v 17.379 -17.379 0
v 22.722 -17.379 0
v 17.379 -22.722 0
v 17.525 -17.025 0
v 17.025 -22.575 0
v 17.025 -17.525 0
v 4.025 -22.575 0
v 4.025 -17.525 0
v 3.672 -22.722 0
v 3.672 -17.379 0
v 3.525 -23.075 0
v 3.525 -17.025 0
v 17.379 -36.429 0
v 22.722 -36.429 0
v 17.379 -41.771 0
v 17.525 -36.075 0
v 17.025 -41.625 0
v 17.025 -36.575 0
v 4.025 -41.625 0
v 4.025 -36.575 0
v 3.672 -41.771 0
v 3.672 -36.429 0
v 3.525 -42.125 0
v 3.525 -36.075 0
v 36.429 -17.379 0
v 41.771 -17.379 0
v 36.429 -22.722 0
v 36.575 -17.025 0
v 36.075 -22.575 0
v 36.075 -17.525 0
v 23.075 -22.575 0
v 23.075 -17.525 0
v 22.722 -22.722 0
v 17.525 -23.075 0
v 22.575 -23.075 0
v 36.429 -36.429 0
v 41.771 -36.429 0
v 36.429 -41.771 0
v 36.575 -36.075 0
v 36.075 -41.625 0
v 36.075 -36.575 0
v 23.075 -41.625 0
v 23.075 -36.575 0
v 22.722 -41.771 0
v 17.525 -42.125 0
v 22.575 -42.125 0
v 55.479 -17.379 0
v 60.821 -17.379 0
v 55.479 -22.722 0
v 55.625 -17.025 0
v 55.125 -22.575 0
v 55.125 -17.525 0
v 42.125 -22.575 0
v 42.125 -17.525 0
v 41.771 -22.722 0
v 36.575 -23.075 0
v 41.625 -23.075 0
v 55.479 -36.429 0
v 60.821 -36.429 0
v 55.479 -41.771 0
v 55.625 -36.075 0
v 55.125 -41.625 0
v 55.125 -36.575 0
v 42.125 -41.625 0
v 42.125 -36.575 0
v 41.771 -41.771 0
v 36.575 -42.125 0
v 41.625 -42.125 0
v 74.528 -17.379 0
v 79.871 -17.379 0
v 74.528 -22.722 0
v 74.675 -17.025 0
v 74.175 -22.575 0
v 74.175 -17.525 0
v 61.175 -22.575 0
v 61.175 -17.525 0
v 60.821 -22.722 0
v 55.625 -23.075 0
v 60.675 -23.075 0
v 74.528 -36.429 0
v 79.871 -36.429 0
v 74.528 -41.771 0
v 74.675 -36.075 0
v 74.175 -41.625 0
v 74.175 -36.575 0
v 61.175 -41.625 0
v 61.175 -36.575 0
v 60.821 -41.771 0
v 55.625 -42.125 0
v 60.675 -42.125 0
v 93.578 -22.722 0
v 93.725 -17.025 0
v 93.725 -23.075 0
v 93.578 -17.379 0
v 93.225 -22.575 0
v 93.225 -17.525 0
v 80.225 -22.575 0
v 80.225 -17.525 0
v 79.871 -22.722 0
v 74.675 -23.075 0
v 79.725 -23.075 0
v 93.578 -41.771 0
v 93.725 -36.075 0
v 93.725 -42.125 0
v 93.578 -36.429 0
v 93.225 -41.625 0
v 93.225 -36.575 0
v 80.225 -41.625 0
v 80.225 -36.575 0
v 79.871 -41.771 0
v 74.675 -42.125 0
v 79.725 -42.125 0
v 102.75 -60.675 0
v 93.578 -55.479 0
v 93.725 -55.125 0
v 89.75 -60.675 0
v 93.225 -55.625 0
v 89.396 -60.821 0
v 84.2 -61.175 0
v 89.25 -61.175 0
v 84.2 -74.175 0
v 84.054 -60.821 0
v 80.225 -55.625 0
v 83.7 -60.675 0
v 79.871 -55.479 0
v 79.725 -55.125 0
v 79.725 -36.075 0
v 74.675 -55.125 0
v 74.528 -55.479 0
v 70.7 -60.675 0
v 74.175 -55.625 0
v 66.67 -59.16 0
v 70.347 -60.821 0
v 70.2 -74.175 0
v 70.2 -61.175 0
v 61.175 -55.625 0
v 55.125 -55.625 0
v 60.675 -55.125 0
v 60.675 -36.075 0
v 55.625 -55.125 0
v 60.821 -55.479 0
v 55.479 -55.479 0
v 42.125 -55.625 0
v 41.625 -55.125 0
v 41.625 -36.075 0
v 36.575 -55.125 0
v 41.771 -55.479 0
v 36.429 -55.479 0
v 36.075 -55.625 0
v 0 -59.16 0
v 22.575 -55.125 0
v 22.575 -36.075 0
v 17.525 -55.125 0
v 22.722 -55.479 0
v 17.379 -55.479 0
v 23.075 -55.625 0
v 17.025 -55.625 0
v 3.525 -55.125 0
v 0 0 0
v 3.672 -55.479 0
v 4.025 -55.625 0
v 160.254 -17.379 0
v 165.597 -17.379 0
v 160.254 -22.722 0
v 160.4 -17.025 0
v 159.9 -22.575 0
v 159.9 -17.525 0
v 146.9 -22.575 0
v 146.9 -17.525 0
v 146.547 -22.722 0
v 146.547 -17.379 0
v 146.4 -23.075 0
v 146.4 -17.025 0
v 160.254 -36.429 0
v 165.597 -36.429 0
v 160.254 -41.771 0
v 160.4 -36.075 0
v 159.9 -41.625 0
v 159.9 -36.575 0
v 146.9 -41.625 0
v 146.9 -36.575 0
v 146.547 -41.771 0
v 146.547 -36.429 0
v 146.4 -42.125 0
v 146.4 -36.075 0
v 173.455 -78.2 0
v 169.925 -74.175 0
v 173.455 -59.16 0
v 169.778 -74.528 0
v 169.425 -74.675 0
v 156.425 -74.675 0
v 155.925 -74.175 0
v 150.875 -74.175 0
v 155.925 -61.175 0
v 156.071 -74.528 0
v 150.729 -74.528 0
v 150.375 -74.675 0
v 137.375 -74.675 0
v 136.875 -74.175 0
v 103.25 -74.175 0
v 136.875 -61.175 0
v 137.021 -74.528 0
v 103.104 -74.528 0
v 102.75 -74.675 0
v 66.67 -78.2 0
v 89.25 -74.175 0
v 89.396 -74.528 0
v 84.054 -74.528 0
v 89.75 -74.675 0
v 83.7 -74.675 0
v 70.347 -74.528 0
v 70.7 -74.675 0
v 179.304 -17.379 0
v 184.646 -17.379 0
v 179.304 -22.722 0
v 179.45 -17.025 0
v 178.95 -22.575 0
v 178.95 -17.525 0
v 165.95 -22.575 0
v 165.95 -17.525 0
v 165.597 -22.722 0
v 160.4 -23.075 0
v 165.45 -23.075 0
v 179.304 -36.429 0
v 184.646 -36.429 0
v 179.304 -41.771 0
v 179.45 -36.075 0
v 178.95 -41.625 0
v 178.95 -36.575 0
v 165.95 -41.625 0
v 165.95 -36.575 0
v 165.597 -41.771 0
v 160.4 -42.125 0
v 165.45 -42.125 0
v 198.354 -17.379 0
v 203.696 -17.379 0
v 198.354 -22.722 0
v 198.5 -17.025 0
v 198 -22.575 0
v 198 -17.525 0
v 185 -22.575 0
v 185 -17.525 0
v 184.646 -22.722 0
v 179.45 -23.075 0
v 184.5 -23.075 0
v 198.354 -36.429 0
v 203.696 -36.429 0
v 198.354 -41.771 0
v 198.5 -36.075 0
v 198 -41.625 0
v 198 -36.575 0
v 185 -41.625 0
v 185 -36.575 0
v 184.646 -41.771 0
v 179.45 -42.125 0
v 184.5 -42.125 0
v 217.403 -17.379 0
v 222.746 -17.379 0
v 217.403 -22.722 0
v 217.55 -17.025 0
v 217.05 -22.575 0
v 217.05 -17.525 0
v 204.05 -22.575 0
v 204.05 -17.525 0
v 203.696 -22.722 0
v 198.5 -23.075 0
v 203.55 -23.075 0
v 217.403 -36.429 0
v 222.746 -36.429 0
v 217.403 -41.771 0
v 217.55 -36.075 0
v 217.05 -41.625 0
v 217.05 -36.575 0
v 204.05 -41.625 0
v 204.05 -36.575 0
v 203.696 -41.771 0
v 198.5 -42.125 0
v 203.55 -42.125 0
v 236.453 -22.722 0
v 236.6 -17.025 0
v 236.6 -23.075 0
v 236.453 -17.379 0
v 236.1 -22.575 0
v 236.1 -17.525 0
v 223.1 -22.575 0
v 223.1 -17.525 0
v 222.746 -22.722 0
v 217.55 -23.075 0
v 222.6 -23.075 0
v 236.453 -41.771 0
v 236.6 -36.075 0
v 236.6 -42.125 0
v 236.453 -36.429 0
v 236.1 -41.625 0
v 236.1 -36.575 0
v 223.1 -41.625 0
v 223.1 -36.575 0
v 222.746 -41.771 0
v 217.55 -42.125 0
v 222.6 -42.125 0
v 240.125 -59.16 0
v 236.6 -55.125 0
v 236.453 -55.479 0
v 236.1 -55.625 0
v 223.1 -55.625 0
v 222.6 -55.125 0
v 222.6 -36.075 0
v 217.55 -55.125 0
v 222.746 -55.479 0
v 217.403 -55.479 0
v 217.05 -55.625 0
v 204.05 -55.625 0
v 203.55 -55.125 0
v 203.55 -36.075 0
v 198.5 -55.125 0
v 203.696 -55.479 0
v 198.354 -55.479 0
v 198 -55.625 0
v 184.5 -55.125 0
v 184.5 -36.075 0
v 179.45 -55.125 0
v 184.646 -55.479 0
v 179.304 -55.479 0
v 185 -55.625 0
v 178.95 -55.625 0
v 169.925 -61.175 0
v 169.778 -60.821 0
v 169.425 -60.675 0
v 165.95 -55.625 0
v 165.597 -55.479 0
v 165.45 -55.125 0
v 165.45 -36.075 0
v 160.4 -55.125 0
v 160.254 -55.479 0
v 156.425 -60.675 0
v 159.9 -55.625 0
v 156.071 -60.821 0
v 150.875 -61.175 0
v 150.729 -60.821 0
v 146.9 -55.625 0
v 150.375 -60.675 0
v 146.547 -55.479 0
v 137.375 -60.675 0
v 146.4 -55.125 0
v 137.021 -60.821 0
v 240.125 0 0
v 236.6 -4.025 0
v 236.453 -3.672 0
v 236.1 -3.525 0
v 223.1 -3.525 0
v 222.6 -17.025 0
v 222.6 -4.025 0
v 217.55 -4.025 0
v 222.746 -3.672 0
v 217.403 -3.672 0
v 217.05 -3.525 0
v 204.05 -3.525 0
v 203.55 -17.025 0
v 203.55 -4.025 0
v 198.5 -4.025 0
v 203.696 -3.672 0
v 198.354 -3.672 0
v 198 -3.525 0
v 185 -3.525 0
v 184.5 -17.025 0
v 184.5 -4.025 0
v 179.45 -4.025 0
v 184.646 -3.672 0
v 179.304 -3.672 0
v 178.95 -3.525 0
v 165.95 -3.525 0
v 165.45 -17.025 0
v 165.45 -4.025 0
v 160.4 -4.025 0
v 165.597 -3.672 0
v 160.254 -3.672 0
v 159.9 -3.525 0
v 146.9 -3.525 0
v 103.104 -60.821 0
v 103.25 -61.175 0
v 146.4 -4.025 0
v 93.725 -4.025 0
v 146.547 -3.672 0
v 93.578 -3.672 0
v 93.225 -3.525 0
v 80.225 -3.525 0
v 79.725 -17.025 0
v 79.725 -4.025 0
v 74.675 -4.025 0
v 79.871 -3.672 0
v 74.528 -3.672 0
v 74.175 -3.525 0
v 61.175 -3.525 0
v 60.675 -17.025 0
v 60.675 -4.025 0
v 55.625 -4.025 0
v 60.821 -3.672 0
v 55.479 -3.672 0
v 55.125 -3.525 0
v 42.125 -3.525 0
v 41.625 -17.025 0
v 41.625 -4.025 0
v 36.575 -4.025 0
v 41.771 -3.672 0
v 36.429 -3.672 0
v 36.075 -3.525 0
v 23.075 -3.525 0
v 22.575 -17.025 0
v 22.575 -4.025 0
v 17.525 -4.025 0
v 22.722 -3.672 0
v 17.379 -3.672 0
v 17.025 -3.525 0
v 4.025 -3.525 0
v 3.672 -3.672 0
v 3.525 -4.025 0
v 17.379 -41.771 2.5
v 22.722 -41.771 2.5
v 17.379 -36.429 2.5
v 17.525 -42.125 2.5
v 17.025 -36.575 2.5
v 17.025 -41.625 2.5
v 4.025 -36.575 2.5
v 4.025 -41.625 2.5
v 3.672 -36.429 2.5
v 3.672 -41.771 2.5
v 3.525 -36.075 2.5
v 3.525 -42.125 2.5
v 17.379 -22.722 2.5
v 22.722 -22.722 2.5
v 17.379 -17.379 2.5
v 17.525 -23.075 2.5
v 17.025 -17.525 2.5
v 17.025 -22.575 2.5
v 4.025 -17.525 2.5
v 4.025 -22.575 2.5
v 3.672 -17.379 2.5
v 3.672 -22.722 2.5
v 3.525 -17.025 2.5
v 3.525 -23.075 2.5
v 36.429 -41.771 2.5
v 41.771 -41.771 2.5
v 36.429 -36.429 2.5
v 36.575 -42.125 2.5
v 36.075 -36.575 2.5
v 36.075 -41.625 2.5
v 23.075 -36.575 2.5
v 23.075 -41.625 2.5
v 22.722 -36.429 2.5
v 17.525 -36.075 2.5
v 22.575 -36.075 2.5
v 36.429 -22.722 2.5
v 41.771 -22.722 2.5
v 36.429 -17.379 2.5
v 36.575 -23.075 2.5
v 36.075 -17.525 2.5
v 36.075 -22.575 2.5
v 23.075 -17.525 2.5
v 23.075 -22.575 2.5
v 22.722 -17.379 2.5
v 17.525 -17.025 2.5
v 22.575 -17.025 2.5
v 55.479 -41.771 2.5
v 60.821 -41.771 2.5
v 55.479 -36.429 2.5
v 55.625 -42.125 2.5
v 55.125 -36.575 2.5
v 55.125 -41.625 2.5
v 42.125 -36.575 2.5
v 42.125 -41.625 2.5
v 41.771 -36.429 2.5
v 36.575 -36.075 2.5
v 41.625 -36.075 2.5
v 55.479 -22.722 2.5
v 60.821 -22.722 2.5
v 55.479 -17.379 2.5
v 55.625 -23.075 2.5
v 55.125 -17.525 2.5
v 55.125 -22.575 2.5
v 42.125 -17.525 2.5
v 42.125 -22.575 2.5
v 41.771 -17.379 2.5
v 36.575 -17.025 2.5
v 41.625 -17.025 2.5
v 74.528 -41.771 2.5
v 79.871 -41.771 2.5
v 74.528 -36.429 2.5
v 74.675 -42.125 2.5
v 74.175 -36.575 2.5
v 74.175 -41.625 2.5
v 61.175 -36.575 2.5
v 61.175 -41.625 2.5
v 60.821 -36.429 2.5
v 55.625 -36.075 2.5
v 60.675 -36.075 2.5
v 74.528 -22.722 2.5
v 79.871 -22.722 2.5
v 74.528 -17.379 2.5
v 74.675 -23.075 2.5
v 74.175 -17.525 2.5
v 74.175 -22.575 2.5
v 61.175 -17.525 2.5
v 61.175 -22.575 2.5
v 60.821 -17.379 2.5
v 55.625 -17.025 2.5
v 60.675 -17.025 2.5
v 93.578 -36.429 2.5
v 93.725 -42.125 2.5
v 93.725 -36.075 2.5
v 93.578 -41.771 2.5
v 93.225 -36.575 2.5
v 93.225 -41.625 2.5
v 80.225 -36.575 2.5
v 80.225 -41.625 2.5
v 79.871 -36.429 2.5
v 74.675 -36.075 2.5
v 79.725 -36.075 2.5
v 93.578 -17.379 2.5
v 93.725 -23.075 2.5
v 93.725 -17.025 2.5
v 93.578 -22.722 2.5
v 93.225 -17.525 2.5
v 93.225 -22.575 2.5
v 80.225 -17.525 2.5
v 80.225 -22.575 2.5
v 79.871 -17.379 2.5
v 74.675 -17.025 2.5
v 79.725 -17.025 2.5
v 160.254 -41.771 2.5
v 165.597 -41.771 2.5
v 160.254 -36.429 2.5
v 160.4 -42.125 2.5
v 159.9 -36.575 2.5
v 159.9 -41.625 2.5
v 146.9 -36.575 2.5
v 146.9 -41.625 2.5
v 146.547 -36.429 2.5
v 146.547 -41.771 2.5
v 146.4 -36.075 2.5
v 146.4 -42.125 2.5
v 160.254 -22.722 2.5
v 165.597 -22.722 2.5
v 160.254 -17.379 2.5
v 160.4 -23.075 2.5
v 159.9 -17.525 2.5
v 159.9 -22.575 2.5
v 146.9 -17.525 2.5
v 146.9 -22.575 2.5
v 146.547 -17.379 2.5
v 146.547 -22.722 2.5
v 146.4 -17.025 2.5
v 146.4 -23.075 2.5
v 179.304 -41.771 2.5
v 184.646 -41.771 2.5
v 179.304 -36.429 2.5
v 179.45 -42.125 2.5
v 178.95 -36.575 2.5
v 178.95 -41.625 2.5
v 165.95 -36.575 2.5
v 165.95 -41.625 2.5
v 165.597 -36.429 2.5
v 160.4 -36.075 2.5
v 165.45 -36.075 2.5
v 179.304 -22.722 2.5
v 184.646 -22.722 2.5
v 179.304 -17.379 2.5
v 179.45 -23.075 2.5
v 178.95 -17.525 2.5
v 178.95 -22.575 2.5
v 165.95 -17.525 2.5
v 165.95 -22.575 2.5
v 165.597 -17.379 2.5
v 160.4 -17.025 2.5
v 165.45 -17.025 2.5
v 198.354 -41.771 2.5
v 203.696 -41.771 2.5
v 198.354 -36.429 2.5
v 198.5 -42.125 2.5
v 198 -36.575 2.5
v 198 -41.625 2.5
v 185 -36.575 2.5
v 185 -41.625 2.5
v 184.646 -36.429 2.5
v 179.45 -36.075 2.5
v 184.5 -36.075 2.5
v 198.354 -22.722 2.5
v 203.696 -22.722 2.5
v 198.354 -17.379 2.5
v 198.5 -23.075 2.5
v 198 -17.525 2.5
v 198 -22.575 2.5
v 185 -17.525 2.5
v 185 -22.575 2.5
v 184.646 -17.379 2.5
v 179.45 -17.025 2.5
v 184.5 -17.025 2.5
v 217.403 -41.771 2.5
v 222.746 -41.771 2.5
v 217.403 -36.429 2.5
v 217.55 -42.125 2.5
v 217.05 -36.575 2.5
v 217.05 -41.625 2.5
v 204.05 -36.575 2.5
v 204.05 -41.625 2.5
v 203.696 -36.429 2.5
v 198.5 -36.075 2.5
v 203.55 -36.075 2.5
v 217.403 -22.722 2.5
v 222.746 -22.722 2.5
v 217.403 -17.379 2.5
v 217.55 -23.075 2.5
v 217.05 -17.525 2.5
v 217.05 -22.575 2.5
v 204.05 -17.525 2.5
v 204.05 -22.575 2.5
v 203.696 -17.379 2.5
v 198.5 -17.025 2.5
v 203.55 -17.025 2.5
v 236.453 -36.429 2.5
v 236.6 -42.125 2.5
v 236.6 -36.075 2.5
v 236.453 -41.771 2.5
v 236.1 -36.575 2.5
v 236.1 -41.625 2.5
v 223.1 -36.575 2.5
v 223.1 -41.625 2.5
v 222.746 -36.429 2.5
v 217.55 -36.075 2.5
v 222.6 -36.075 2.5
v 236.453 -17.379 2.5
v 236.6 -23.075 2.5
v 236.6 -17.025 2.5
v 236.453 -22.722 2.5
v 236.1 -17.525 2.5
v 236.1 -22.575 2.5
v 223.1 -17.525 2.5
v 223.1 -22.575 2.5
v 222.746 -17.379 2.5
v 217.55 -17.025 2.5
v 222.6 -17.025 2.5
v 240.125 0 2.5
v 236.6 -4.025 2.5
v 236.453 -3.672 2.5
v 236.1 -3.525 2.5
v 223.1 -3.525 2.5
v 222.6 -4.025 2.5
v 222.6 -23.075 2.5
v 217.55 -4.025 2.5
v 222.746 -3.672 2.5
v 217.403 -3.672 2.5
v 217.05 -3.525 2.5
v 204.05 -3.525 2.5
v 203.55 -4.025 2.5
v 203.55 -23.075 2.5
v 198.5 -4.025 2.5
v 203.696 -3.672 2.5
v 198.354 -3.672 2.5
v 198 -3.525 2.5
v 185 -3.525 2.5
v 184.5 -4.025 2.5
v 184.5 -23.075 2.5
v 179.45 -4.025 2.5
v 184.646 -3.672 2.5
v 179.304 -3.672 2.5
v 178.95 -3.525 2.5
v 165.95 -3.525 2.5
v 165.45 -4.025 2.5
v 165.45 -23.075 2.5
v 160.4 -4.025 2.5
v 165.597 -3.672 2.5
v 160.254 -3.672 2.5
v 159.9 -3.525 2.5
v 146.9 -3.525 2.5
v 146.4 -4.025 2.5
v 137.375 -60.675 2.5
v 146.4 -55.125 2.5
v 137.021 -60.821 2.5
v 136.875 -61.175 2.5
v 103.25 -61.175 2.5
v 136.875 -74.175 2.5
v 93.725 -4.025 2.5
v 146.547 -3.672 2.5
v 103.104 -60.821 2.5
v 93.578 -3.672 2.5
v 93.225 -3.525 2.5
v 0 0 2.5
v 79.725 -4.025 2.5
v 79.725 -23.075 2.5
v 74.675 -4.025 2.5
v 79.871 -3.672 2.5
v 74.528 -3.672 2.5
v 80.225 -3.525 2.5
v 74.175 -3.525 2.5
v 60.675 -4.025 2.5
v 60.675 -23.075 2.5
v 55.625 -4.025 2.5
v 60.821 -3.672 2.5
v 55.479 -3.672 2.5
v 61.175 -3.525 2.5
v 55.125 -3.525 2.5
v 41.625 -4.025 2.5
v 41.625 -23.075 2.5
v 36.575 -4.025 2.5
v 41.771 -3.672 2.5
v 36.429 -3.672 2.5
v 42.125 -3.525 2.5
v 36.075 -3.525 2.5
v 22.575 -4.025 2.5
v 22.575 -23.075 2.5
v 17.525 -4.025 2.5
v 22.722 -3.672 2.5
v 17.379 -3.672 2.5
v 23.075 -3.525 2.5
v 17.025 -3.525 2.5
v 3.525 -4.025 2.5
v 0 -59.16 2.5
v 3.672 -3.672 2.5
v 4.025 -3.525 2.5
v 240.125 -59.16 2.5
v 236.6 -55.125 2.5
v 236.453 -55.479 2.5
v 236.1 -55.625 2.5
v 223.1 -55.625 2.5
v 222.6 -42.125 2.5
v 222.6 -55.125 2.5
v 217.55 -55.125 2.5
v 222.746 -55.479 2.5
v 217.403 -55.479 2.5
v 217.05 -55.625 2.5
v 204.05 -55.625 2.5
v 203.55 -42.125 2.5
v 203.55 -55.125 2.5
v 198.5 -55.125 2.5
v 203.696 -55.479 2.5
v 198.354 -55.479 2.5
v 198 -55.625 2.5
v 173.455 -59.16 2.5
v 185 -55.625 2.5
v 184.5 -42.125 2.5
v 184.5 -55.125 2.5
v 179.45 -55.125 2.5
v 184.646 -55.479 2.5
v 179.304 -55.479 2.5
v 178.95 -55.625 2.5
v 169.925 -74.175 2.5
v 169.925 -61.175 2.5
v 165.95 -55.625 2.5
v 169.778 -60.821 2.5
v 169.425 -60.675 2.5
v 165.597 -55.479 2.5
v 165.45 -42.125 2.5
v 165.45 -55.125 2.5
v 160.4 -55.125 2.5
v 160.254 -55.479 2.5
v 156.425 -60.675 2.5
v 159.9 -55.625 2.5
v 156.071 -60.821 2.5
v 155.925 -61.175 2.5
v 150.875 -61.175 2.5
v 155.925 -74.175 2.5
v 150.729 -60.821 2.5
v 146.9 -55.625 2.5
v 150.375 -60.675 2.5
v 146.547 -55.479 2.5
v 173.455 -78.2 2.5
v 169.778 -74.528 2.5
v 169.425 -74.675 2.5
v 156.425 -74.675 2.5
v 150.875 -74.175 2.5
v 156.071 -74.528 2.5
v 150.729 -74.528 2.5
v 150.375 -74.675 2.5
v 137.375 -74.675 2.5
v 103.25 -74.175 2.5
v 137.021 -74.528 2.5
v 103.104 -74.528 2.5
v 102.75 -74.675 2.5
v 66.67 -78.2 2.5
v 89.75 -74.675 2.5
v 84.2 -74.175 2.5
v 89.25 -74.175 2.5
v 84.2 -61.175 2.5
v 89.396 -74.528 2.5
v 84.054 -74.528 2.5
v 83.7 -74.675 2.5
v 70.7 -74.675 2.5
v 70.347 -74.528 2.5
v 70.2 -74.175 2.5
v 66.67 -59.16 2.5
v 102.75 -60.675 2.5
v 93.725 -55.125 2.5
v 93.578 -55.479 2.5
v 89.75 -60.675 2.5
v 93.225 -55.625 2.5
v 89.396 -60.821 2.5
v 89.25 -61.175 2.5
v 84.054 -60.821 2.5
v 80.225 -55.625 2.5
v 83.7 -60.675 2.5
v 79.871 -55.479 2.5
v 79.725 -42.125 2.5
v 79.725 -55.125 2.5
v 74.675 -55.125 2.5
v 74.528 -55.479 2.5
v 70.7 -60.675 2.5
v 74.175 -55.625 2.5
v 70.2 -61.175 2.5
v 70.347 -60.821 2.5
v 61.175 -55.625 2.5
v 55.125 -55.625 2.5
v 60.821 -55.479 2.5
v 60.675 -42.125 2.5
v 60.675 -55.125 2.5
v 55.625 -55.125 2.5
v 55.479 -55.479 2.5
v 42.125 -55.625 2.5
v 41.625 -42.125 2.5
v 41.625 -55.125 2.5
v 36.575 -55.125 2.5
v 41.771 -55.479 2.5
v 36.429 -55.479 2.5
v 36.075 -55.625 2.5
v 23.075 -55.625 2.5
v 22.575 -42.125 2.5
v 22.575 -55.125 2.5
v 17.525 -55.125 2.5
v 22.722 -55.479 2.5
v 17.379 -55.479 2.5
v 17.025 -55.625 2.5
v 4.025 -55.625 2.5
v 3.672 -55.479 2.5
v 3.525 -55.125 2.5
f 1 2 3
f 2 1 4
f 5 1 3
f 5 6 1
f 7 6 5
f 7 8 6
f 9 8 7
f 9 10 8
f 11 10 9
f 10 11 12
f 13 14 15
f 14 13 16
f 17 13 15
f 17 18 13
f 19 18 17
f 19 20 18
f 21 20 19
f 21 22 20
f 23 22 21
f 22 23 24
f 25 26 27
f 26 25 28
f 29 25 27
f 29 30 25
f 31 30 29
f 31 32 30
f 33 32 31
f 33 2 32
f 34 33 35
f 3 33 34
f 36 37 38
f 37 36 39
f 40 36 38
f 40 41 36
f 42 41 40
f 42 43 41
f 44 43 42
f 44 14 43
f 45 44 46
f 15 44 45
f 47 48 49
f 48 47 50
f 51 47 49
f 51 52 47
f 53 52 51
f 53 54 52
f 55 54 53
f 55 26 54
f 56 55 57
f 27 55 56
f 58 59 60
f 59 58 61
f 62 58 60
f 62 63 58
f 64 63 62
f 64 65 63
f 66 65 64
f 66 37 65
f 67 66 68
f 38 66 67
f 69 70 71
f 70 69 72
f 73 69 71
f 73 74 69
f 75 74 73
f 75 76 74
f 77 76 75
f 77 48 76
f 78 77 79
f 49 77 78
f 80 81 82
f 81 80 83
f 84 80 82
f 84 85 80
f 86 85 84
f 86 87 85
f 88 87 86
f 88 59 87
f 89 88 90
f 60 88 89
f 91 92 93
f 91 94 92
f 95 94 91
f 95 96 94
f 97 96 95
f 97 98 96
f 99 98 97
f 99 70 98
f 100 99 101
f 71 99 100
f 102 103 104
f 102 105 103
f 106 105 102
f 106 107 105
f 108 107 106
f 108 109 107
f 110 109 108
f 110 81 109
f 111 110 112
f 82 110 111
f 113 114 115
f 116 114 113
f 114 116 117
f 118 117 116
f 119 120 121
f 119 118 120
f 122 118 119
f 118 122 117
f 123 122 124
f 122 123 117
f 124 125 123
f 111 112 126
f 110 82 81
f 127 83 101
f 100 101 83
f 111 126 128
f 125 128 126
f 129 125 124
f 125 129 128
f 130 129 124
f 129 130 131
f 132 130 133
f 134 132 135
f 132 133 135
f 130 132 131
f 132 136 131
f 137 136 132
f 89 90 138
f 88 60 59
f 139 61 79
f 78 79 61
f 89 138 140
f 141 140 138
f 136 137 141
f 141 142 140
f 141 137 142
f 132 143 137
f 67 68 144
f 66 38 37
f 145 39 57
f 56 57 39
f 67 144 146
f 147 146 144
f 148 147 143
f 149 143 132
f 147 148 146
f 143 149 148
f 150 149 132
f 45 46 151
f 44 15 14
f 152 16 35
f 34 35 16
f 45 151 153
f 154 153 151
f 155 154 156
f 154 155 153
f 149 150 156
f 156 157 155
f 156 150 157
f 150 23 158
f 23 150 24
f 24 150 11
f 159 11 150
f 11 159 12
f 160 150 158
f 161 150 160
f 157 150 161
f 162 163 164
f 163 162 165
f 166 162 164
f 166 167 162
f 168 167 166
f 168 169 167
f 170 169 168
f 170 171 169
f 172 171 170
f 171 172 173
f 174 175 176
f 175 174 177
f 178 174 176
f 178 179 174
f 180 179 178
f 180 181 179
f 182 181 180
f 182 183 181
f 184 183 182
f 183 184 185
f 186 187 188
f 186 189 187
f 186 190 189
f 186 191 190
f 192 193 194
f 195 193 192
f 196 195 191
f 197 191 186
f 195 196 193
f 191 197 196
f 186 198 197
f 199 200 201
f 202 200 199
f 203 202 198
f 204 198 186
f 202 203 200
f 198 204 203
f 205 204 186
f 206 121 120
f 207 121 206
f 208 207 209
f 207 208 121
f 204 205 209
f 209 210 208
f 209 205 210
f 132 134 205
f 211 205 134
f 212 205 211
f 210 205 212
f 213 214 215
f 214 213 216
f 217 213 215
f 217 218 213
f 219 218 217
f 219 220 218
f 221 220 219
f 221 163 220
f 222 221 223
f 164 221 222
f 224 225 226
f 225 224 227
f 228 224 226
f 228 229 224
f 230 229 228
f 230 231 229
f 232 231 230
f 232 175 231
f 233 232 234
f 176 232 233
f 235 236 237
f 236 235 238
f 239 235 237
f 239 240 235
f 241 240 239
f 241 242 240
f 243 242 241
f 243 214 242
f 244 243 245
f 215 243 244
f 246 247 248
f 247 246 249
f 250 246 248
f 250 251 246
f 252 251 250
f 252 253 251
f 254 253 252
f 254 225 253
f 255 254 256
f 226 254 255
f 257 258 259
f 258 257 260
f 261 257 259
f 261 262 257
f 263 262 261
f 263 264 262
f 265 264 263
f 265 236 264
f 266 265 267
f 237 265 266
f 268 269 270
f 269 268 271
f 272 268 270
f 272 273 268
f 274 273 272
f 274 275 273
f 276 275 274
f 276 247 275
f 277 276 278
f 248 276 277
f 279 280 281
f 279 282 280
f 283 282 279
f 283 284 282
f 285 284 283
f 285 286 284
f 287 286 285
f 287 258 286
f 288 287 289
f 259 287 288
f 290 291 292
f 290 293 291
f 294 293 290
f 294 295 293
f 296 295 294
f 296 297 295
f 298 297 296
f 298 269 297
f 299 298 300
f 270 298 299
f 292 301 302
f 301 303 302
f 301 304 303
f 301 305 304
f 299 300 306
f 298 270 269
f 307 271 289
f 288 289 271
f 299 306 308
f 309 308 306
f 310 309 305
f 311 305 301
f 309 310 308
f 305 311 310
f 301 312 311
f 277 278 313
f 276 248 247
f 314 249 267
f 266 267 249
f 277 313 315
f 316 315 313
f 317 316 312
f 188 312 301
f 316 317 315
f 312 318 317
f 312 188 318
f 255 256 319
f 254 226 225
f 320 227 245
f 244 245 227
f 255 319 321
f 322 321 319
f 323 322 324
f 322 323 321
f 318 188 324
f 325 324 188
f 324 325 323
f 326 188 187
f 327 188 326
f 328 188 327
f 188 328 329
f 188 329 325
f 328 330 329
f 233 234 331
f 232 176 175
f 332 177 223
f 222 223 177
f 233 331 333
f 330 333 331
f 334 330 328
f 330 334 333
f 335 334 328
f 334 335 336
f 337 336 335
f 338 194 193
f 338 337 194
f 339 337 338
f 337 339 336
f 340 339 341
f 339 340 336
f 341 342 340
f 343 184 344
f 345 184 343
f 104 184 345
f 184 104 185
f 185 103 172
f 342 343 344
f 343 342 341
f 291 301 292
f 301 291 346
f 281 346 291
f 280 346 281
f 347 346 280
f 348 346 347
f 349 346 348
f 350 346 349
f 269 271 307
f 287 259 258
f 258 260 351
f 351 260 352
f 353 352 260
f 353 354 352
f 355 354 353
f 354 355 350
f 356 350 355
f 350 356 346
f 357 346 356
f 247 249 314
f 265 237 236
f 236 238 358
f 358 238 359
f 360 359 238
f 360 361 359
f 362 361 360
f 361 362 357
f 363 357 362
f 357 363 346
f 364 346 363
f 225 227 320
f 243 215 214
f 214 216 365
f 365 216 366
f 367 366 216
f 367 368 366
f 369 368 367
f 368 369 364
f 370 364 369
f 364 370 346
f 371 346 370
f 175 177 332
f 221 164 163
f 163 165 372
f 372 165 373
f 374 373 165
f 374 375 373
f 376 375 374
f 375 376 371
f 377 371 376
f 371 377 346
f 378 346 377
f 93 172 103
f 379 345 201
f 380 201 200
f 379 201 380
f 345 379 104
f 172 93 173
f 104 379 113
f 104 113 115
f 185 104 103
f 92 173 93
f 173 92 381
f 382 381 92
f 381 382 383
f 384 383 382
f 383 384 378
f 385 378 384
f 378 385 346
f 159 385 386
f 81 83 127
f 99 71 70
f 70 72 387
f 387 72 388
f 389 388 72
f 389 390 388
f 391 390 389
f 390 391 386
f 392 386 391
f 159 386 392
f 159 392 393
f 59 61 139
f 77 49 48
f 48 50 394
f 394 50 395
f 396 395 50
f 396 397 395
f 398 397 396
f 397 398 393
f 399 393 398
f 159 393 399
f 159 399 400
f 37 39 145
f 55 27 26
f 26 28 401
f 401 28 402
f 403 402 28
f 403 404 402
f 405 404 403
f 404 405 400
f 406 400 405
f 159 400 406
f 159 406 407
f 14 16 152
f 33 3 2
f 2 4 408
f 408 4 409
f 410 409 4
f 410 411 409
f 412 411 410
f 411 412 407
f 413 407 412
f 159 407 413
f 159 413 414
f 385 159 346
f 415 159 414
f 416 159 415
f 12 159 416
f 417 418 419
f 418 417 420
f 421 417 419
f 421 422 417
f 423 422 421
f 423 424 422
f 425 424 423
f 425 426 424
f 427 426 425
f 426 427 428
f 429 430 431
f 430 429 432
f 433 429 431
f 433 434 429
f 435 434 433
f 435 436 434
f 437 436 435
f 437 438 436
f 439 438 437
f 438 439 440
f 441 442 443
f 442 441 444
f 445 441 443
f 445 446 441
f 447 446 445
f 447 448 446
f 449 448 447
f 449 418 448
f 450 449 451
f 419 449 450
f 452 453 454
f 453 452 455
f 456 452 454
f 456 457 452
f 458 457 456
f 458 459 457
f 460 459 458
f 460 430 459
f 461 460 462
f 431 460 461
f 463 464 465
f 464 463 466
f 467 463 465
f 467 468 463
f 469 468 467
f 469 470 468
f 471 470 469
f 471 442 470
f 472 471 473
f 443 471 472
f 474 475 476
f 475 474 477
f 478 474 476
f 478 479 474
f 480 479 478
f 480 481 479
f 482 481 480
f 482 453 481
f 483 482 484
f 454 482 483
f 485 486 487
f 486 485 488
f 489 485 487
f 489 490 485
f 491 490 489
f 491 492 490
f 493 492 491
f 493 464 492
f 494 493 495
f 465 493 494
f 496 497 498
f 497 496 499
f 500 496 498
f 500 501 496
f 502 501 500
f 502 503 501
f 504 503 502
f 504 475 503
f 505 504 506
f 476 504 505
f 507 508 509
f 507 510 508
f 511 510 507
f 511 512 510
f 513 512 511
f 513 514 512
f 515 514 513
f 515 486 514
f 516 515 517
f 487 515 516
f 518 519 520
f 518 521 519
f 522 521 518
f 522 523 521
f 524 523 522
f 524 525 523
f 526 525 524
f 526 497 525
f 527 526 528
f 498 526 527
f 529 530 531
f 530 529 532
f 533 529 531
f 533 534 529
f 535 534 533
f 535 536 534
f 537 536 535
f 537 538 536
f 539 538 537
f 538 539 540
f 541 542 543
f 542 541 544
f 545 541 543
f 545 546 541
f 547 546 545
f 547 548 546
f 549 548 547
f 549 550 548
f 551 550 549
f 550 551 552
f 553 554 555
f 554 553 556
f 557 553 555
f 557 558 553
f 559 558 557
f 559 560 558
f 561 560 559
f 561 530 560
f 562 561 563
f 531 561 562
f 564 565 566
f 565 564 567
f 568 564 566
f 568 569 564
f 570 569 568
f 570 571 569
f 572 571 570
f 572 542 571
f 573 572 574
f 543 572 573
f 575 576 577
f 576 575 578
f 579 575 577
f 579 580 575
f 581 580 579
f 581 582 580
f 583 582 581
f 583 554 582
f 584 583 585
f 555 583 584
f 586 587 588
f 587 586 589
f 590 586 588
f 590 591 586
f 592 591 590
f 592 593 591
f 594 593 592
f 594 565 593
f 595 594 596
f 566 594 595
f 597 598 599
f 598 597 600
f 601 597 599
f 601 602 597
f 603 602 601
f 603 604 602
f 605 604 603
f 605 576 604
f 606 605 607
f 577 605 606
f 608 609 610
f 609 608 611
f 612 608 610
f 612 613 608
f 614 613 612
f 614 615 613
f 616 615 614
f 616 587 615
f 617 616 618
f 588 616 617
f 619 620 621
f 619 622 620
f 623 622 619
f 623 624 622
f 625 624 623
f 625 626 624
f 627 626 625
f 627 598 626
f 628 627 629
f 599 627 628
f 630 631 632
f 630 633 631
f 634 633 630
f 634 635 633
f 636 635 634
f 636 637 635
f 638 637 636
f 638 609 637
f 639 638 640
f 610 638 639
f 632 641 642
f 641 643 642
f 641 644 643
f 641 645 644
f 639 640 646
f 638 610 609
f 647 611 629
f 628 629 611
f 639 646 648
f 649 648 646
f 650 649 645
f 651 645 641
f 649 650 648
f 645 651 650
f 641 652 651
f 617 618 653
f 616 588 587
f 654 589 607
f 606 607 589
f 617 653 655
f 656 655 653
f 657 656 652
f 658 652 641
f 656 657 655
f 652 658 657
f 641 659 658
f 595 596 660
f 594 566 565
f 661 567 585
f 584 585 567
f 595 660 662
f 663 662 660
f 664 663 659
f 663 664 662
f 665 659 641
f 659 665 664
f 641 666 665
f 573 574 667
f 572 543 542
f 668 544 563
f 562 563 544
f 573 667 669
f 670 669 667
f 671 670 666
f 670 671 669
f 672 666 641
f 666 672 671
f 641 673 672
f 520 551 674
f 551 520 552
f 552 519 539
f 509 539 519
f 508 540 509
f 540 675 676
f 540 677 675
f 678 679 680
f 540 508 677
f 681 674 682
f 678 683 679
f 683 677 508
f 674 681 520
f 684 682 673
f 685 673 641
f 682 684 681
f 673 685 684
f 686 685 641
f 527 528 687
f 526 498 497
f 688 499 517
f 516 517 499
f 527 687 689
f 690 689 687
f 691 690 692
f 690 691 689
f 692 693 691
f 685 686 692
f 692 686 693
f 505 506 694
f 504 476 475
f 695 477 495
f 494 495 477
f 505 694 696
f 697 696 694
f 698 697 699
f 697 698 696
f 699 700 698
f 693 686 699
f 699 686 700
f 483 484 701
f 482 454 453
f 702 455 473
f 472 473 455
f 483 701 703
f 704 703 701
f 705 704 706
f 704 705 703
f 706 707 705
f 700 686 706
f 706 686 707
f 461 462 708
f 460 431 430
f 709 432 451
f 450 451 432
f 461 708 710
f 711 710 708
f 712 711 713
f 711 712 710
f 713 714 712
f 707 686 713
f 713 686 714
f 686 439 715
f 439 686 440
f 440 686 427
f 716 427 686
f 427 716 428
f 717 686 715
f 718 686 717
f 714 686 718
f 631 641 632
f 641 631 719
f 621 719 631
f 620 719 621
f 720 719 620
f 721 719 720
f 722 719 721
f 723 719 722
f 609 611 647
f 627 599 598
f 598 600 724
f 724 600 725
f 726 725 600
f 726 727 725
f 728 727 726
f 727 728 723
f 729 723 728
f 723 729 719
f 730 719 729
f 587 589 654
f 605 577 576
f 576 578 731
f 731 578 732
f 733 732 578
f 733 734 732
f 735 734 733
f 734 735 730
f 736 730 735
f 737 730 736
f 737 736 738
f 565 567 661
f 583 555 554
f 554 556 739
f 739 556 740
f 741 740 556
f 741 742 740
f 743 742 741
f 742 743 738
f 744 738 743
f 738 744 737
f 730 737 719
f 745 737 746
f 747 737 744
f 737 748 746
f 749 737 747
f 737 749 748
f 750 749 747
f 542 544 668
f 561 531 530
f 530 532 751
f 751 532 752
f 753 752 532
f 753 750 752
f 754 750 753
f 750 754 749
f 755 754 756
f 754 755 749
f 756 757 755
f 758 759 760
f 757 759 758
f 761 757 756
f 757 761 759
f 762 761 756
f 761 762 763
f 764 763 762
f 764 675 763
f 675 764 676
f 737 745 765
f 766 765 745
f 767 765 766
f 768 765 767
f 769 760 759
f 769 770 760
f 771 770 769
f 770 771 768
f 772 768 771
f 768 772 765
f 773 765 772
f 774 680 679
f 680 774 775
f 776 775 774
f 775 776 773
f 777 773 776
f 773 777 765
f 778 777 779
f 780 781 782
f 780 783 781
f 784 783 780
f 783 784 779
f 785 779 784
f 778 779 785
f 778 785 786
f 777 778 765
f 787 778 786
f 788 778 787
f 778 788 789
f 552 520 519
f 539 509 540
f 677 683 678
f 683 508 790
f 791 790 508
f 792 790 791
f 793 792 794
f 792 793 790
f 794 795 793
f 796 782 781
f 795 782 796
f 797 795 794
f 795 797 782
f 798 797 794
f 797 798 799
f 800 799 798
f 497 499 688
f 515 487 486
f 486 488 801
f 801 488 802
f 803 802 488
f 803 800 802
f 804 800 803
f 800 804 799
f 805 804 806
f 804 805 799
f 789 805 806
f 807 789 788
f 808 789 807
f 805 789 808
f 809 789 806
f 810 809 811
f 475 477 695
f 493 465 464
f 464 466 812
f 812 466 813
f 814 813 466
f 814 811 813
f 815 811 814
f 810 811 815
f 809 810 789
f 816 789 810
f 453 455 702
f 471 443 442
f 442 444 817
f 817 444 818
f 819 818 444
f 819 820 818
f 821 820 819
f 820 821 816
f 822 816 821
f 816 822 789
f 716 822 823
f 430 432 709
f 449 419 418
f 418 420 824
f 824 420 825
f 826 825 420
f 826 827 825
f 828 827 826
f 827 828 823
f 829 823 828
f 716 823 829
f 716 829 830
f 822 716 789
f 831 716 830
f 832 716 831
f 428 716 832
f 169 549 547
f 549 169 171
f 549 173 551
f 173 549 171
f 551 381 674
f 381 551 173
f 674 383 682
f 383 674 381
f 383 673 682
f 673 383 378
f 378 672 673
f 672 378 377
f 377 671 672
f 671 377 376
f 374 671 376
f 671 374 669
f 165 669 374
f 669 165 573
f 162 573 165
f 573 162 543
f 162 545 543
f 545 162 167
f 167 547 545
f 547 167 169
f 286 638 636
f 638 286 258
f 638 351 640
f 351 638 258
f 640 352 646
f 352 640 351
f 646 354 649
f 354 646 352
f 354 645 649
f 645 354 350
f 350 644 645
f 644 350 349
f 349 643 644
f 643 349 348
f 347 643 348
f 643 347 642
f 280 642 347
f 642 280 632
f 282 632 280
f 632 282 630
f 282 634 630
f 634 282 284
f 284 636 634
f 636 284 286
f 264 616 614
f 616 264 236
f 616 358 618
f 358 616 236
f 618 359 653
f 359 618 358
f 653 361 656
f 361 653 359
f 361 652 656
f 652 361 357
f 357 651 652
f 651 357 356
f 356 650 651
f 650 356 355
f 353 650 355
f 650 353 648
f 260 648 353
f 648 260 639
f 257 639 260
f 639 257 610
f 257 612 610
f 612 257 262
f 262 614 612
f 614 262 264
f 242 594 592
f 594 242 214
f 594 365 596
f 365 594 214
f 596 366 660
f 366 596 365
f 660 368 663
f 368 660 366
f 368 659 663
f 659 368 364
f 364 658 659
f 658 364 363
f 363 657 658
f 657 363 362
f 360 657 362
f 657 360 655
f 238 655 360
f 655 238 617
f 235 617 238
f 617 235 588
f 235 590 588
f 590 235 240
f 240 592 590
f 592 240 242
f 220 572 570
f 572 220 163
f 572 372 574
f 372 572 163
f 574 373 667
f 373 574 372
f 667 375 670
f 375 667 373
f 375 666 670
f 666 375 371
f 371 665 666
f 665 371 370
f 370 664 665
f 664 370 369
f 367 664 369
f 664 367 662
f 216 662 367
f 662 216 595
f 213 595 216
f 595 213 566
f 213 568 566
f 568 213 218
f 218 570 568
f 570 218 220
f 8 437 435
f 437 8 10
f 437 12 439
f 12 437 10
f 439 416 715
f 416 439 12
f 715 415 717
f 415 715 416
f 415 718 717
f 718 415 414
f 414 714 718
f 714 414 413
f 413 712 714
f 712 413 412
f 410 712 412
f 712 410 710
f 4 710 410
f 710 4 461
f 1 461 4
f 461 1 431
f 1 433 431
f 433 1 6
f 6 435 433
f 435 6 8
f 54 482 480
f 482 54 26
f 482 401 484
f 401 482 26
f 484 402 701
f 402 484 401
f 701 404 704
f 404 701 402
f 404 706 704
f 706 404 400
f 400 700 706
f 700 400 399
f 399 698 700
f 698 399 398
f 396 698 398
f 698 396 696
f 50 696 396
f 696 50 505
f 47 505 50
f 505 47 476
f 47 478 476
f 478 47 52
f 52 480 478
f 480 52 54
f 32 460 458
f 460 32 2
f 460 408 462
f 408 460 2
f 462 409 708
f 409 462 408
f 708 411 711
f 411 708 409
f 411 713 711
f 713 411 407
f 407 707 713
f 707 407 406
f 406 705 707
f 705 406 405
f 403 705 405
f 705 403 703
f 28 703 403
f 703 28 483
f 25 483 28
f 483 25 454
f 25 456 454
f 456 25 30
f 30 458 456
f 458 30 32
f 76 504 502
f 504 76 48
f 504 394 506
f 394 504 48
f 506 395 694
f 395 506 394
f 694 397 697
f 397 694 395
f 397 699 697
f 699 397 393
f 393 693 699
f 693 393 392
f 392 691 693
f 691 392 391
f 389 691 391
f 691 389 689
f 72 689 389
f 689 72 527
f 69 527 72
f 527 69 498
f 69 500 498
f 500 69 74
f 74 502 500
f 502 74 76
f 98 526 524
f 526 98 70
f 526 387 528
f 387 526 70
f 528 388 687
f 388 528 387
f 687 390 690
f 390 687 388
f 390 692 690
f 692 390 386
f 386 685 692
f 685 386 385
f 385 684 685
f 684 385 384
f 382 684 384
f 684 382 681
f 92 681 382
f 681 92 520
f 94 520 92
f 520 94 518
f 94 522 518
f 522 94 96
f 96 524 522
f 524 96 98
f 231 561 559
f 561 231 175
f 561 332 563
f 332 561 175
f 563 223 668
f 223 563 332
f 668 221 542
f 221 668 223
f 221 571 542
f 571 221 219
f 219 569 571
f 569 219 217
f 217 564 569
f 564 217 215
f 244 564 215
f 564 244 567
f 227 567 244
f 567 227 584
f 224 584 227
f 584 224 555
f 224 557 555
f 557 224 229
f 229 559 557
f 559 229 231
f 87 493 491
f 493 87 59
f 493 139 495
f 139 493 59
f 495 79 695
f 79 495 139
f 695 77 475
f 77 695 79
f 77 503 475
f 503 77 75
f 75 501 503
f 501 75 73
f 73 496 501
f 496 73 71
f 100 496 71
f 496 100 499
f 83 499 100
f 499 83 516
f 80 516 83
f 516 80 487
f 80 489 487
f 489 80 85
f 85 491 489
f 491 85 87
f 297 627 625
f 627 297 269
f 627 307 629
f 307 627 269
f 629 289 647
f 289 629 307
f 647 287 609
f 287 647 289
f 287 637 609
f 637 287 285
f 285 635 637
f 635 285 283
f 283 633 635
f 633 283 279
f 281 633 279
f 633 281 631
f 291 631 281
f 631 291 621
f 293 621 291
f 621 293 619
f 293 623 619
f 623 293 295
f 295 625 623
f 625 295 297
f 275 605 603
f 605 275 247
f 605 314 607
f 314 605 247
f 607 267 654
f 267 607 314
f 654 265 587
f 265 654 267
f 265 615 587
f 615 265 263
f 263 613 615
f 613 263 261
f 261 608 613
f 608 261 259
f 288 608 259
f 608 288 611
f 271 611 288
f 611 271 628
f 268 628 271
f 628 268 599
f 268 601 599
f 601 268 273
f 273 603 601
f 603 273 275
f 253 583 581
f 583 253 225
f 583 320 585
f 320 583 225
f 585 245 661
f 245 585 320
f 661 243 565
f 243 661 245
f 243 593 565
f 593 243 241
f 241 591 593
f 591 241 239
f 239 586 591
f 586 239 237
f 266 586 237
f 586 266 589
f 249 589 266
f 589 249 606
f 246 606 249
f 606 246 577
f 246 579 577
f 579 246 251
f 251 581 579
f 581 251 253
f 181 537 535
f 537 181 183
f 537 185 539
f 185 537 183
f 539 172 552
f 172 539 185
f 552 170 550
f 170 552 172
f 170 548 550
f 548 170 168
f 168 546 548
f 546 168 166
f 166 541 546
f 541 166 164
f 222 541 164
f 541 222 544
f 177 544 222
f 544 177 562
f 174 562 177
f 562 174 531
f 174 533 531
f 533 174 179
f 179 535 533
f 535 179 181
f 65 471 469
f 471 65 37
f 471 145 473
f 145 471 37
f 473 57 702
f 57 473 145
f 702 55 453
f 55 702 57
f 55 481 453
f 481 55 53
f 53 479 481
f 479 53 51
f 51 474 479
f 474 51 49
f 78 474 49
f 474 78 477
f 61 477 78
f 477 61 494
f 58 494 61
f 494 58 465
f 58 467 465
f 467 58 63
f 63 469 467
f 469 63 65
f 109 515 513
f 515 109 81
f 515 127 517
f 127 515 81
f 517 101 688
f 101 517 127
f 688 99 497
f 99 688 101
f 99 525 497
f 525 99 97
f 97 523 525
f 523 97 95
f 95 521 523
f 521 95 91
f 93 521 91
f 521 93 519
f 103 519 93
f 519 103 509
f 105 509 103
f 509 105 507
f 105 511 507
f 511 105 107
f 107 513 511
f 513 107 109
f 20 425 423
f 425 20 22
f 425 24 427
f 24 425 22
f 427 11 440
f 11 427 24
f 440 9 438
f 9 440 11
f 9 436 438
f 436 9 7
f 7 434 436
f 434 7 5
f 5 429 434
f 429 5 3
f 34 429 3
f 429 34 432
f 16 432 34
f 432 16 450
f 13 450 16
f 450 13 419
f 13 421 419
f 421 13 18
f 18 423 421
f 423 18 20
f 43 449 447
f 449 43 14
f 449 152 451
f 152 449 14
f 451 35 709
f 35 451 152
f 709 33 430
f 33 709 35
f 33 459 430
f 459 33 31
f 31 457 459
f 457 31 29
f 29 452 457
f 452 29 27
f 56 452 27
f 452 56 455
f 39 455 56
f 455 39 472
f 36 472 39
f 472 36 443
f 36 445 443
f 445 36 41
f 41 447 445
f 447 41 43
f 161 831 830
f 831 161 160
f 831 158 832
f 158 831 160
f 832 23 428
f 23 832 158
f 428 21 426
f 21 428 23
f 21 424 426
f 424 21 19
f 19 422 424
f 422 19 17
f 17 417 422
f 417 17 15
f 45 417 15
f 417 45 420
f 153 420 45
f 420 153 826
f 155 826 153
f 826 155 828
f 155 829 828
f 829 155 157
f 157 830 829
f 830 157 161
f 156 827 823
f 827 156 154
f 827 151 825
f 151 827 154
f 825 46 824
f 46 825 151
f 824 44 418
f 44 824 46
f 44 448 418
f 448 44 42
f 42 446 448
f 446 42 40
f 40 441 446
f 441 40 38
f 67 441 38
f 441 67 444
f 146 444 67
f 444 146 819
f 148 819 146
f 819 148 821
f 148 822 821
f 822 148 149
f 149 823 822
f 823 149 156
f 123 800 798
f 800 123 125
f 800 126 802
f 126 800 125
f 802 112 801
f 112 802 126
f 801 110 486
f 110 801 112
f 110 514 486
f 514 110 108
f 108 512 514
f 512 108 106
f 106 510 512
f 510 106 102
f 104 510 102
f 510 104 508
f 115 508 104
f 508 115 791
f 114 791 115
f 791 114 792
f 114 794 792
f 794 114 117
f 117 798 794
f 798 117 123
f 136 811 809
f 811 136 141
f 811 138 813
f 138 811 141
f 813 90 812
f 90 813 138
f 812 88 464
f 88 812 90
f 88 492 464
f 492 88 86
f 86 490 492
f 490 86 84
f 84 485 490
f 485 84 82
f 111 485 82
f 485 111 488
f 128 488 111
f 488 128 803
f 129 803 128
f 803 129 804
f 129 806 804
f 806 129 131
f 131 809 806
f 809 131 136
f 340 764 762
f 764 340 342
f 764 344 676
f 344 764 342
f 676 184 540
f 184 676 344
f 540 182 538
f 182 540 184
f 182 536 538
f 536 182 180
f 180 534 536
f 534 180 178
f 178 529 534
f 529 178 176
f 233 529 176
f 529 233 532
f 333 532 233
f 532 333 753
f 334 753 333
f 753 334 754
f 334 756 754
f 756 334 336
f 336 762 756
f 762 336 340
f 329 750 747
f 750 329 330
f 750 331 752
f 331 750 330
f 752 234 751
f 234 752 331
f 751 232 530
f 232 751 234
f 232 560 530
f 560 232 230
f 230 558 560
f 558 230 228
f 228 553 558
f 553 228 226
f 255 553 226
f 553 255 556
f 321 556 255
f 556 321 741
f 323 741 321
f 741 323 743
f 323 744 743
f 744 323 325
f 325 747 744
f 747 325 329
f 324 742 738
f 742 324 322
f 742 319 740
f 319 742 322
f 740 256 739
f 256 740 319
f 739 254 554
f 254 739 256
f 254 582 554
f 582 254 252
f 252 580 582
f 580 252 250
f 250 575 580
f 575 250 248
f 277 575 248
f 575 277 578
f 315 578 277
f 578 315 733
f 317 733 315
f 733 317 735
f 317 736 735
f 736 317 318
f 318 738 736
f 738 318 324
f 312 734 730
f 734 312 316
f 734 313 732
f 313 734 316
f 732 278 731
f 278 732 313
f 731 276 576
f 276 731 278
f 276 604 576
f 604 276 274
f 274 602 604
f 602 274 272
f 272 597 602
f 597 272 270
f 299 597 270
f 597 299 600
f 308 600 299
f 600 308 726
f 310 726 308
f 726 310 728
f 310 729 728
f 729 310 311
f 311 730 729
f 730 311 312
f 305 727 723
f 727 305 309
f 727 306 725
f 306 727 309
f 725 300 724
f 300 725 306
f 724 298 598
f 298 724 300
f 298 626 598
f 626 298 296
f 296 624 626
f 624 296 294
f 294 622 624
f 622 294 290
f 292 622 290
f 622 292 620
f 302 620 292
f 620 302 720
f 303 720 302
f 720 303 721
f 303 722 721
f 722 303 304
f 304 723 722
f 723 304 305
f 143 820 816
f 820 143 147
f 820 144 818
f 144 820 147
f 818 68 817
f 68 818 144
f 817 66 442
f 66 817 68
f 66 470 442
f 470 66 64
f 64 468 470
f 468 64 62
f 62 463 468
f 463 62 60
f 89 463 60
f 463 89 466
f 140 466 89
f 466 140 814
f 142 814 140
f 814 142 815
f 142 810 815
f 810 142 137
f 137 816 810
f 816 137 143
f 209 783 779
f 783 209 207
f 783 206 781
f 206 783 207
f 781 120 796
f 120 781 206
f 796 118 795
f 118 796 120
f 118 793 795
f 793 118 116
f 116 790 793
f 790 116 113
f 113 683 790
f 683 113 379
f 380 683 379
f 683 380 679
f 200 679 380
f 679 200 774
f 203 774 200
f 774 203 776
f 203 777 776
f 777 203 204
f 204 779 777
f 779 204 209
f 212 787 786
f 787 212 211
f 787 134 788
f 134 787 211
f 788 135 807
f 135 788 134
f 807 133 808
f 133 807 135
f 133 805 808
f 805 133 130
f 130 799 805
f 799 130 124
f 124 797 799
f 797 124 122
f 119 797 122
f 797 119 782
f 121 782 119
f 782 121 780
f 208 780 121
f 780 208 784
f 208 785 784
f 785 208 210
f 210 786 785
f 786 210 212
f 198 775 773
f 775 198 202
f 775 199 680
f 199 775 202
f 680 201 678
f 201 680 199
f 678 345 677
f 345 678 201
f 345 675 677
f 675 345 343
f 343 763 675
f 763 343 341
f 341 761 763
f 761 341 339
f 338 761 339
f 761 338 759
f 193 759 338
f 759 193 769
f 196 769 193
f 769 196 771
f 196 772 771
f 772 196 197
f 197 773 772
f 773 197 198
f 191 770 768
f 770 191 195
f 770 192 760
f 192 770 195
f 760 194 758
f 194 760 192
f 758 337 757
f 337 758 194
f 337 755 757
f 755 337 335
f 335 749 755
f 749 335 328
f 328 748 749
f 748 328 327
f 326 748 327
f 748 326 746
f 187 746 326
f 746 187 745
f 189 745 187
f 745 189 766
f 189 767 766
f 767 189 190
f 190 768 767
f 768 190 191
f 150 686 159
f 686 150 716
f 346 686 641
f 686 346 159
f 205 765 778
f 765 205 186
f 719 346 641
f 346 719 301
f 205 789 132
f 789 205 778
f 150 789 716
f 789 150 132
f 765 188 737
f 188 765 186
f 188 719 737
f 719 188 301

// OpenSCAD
// $fn = 100;

body_height = 2.5;
body_depth = 76.20;
body_length = 238.125;
body_margin = 2.52;
body_padding = 1;

screw_head_diameter = 5.7;
screw_head_height = 3.8;
screw_body_diameter = 2.86;

module plate() {
  union() {
    translate([body_padding, -body_padding, 0])
      linear_extrude(height=body_height) {
        import("plate.dxf");
      }

    translate([0, -(body_depth + (body_padding * 2)), 0])
      cube([body_padding, body_depth + (body_padding * 2), body_height]);

    translate([(body_length + body_padding), -(body_depth + (body_padding * 2)), 0])
      #cube([body_padding, body_depth + (body_padding * 2), body_height]);

    translate([0,-body_padding,0])
      cube([(body_length + (body_padding * 2)), body_padding, body_height]);

    translate([0,-((body_padding * 2) + body_depth),0])
      cube([(body_length + (body_padding * 2)), body_padding, body_height]);
  }
}

module plate_cuts() {
  cut_length = 69.19 - body_margin;
  cut_depth = 21.56 - body_margin;

  translate([0, -(body_depth + (body_padding * 2)), 0])
    cube([cut_length, cut_depth, body_height]);

  translate([(body_length - cut_length + (body_padding * 2)), -(body_depth + (body_padding * 2)), 0])
    cube([cut_length, cut_depth, body_height]);
}

difference() {
  plate();
  plate_cuts();
}
